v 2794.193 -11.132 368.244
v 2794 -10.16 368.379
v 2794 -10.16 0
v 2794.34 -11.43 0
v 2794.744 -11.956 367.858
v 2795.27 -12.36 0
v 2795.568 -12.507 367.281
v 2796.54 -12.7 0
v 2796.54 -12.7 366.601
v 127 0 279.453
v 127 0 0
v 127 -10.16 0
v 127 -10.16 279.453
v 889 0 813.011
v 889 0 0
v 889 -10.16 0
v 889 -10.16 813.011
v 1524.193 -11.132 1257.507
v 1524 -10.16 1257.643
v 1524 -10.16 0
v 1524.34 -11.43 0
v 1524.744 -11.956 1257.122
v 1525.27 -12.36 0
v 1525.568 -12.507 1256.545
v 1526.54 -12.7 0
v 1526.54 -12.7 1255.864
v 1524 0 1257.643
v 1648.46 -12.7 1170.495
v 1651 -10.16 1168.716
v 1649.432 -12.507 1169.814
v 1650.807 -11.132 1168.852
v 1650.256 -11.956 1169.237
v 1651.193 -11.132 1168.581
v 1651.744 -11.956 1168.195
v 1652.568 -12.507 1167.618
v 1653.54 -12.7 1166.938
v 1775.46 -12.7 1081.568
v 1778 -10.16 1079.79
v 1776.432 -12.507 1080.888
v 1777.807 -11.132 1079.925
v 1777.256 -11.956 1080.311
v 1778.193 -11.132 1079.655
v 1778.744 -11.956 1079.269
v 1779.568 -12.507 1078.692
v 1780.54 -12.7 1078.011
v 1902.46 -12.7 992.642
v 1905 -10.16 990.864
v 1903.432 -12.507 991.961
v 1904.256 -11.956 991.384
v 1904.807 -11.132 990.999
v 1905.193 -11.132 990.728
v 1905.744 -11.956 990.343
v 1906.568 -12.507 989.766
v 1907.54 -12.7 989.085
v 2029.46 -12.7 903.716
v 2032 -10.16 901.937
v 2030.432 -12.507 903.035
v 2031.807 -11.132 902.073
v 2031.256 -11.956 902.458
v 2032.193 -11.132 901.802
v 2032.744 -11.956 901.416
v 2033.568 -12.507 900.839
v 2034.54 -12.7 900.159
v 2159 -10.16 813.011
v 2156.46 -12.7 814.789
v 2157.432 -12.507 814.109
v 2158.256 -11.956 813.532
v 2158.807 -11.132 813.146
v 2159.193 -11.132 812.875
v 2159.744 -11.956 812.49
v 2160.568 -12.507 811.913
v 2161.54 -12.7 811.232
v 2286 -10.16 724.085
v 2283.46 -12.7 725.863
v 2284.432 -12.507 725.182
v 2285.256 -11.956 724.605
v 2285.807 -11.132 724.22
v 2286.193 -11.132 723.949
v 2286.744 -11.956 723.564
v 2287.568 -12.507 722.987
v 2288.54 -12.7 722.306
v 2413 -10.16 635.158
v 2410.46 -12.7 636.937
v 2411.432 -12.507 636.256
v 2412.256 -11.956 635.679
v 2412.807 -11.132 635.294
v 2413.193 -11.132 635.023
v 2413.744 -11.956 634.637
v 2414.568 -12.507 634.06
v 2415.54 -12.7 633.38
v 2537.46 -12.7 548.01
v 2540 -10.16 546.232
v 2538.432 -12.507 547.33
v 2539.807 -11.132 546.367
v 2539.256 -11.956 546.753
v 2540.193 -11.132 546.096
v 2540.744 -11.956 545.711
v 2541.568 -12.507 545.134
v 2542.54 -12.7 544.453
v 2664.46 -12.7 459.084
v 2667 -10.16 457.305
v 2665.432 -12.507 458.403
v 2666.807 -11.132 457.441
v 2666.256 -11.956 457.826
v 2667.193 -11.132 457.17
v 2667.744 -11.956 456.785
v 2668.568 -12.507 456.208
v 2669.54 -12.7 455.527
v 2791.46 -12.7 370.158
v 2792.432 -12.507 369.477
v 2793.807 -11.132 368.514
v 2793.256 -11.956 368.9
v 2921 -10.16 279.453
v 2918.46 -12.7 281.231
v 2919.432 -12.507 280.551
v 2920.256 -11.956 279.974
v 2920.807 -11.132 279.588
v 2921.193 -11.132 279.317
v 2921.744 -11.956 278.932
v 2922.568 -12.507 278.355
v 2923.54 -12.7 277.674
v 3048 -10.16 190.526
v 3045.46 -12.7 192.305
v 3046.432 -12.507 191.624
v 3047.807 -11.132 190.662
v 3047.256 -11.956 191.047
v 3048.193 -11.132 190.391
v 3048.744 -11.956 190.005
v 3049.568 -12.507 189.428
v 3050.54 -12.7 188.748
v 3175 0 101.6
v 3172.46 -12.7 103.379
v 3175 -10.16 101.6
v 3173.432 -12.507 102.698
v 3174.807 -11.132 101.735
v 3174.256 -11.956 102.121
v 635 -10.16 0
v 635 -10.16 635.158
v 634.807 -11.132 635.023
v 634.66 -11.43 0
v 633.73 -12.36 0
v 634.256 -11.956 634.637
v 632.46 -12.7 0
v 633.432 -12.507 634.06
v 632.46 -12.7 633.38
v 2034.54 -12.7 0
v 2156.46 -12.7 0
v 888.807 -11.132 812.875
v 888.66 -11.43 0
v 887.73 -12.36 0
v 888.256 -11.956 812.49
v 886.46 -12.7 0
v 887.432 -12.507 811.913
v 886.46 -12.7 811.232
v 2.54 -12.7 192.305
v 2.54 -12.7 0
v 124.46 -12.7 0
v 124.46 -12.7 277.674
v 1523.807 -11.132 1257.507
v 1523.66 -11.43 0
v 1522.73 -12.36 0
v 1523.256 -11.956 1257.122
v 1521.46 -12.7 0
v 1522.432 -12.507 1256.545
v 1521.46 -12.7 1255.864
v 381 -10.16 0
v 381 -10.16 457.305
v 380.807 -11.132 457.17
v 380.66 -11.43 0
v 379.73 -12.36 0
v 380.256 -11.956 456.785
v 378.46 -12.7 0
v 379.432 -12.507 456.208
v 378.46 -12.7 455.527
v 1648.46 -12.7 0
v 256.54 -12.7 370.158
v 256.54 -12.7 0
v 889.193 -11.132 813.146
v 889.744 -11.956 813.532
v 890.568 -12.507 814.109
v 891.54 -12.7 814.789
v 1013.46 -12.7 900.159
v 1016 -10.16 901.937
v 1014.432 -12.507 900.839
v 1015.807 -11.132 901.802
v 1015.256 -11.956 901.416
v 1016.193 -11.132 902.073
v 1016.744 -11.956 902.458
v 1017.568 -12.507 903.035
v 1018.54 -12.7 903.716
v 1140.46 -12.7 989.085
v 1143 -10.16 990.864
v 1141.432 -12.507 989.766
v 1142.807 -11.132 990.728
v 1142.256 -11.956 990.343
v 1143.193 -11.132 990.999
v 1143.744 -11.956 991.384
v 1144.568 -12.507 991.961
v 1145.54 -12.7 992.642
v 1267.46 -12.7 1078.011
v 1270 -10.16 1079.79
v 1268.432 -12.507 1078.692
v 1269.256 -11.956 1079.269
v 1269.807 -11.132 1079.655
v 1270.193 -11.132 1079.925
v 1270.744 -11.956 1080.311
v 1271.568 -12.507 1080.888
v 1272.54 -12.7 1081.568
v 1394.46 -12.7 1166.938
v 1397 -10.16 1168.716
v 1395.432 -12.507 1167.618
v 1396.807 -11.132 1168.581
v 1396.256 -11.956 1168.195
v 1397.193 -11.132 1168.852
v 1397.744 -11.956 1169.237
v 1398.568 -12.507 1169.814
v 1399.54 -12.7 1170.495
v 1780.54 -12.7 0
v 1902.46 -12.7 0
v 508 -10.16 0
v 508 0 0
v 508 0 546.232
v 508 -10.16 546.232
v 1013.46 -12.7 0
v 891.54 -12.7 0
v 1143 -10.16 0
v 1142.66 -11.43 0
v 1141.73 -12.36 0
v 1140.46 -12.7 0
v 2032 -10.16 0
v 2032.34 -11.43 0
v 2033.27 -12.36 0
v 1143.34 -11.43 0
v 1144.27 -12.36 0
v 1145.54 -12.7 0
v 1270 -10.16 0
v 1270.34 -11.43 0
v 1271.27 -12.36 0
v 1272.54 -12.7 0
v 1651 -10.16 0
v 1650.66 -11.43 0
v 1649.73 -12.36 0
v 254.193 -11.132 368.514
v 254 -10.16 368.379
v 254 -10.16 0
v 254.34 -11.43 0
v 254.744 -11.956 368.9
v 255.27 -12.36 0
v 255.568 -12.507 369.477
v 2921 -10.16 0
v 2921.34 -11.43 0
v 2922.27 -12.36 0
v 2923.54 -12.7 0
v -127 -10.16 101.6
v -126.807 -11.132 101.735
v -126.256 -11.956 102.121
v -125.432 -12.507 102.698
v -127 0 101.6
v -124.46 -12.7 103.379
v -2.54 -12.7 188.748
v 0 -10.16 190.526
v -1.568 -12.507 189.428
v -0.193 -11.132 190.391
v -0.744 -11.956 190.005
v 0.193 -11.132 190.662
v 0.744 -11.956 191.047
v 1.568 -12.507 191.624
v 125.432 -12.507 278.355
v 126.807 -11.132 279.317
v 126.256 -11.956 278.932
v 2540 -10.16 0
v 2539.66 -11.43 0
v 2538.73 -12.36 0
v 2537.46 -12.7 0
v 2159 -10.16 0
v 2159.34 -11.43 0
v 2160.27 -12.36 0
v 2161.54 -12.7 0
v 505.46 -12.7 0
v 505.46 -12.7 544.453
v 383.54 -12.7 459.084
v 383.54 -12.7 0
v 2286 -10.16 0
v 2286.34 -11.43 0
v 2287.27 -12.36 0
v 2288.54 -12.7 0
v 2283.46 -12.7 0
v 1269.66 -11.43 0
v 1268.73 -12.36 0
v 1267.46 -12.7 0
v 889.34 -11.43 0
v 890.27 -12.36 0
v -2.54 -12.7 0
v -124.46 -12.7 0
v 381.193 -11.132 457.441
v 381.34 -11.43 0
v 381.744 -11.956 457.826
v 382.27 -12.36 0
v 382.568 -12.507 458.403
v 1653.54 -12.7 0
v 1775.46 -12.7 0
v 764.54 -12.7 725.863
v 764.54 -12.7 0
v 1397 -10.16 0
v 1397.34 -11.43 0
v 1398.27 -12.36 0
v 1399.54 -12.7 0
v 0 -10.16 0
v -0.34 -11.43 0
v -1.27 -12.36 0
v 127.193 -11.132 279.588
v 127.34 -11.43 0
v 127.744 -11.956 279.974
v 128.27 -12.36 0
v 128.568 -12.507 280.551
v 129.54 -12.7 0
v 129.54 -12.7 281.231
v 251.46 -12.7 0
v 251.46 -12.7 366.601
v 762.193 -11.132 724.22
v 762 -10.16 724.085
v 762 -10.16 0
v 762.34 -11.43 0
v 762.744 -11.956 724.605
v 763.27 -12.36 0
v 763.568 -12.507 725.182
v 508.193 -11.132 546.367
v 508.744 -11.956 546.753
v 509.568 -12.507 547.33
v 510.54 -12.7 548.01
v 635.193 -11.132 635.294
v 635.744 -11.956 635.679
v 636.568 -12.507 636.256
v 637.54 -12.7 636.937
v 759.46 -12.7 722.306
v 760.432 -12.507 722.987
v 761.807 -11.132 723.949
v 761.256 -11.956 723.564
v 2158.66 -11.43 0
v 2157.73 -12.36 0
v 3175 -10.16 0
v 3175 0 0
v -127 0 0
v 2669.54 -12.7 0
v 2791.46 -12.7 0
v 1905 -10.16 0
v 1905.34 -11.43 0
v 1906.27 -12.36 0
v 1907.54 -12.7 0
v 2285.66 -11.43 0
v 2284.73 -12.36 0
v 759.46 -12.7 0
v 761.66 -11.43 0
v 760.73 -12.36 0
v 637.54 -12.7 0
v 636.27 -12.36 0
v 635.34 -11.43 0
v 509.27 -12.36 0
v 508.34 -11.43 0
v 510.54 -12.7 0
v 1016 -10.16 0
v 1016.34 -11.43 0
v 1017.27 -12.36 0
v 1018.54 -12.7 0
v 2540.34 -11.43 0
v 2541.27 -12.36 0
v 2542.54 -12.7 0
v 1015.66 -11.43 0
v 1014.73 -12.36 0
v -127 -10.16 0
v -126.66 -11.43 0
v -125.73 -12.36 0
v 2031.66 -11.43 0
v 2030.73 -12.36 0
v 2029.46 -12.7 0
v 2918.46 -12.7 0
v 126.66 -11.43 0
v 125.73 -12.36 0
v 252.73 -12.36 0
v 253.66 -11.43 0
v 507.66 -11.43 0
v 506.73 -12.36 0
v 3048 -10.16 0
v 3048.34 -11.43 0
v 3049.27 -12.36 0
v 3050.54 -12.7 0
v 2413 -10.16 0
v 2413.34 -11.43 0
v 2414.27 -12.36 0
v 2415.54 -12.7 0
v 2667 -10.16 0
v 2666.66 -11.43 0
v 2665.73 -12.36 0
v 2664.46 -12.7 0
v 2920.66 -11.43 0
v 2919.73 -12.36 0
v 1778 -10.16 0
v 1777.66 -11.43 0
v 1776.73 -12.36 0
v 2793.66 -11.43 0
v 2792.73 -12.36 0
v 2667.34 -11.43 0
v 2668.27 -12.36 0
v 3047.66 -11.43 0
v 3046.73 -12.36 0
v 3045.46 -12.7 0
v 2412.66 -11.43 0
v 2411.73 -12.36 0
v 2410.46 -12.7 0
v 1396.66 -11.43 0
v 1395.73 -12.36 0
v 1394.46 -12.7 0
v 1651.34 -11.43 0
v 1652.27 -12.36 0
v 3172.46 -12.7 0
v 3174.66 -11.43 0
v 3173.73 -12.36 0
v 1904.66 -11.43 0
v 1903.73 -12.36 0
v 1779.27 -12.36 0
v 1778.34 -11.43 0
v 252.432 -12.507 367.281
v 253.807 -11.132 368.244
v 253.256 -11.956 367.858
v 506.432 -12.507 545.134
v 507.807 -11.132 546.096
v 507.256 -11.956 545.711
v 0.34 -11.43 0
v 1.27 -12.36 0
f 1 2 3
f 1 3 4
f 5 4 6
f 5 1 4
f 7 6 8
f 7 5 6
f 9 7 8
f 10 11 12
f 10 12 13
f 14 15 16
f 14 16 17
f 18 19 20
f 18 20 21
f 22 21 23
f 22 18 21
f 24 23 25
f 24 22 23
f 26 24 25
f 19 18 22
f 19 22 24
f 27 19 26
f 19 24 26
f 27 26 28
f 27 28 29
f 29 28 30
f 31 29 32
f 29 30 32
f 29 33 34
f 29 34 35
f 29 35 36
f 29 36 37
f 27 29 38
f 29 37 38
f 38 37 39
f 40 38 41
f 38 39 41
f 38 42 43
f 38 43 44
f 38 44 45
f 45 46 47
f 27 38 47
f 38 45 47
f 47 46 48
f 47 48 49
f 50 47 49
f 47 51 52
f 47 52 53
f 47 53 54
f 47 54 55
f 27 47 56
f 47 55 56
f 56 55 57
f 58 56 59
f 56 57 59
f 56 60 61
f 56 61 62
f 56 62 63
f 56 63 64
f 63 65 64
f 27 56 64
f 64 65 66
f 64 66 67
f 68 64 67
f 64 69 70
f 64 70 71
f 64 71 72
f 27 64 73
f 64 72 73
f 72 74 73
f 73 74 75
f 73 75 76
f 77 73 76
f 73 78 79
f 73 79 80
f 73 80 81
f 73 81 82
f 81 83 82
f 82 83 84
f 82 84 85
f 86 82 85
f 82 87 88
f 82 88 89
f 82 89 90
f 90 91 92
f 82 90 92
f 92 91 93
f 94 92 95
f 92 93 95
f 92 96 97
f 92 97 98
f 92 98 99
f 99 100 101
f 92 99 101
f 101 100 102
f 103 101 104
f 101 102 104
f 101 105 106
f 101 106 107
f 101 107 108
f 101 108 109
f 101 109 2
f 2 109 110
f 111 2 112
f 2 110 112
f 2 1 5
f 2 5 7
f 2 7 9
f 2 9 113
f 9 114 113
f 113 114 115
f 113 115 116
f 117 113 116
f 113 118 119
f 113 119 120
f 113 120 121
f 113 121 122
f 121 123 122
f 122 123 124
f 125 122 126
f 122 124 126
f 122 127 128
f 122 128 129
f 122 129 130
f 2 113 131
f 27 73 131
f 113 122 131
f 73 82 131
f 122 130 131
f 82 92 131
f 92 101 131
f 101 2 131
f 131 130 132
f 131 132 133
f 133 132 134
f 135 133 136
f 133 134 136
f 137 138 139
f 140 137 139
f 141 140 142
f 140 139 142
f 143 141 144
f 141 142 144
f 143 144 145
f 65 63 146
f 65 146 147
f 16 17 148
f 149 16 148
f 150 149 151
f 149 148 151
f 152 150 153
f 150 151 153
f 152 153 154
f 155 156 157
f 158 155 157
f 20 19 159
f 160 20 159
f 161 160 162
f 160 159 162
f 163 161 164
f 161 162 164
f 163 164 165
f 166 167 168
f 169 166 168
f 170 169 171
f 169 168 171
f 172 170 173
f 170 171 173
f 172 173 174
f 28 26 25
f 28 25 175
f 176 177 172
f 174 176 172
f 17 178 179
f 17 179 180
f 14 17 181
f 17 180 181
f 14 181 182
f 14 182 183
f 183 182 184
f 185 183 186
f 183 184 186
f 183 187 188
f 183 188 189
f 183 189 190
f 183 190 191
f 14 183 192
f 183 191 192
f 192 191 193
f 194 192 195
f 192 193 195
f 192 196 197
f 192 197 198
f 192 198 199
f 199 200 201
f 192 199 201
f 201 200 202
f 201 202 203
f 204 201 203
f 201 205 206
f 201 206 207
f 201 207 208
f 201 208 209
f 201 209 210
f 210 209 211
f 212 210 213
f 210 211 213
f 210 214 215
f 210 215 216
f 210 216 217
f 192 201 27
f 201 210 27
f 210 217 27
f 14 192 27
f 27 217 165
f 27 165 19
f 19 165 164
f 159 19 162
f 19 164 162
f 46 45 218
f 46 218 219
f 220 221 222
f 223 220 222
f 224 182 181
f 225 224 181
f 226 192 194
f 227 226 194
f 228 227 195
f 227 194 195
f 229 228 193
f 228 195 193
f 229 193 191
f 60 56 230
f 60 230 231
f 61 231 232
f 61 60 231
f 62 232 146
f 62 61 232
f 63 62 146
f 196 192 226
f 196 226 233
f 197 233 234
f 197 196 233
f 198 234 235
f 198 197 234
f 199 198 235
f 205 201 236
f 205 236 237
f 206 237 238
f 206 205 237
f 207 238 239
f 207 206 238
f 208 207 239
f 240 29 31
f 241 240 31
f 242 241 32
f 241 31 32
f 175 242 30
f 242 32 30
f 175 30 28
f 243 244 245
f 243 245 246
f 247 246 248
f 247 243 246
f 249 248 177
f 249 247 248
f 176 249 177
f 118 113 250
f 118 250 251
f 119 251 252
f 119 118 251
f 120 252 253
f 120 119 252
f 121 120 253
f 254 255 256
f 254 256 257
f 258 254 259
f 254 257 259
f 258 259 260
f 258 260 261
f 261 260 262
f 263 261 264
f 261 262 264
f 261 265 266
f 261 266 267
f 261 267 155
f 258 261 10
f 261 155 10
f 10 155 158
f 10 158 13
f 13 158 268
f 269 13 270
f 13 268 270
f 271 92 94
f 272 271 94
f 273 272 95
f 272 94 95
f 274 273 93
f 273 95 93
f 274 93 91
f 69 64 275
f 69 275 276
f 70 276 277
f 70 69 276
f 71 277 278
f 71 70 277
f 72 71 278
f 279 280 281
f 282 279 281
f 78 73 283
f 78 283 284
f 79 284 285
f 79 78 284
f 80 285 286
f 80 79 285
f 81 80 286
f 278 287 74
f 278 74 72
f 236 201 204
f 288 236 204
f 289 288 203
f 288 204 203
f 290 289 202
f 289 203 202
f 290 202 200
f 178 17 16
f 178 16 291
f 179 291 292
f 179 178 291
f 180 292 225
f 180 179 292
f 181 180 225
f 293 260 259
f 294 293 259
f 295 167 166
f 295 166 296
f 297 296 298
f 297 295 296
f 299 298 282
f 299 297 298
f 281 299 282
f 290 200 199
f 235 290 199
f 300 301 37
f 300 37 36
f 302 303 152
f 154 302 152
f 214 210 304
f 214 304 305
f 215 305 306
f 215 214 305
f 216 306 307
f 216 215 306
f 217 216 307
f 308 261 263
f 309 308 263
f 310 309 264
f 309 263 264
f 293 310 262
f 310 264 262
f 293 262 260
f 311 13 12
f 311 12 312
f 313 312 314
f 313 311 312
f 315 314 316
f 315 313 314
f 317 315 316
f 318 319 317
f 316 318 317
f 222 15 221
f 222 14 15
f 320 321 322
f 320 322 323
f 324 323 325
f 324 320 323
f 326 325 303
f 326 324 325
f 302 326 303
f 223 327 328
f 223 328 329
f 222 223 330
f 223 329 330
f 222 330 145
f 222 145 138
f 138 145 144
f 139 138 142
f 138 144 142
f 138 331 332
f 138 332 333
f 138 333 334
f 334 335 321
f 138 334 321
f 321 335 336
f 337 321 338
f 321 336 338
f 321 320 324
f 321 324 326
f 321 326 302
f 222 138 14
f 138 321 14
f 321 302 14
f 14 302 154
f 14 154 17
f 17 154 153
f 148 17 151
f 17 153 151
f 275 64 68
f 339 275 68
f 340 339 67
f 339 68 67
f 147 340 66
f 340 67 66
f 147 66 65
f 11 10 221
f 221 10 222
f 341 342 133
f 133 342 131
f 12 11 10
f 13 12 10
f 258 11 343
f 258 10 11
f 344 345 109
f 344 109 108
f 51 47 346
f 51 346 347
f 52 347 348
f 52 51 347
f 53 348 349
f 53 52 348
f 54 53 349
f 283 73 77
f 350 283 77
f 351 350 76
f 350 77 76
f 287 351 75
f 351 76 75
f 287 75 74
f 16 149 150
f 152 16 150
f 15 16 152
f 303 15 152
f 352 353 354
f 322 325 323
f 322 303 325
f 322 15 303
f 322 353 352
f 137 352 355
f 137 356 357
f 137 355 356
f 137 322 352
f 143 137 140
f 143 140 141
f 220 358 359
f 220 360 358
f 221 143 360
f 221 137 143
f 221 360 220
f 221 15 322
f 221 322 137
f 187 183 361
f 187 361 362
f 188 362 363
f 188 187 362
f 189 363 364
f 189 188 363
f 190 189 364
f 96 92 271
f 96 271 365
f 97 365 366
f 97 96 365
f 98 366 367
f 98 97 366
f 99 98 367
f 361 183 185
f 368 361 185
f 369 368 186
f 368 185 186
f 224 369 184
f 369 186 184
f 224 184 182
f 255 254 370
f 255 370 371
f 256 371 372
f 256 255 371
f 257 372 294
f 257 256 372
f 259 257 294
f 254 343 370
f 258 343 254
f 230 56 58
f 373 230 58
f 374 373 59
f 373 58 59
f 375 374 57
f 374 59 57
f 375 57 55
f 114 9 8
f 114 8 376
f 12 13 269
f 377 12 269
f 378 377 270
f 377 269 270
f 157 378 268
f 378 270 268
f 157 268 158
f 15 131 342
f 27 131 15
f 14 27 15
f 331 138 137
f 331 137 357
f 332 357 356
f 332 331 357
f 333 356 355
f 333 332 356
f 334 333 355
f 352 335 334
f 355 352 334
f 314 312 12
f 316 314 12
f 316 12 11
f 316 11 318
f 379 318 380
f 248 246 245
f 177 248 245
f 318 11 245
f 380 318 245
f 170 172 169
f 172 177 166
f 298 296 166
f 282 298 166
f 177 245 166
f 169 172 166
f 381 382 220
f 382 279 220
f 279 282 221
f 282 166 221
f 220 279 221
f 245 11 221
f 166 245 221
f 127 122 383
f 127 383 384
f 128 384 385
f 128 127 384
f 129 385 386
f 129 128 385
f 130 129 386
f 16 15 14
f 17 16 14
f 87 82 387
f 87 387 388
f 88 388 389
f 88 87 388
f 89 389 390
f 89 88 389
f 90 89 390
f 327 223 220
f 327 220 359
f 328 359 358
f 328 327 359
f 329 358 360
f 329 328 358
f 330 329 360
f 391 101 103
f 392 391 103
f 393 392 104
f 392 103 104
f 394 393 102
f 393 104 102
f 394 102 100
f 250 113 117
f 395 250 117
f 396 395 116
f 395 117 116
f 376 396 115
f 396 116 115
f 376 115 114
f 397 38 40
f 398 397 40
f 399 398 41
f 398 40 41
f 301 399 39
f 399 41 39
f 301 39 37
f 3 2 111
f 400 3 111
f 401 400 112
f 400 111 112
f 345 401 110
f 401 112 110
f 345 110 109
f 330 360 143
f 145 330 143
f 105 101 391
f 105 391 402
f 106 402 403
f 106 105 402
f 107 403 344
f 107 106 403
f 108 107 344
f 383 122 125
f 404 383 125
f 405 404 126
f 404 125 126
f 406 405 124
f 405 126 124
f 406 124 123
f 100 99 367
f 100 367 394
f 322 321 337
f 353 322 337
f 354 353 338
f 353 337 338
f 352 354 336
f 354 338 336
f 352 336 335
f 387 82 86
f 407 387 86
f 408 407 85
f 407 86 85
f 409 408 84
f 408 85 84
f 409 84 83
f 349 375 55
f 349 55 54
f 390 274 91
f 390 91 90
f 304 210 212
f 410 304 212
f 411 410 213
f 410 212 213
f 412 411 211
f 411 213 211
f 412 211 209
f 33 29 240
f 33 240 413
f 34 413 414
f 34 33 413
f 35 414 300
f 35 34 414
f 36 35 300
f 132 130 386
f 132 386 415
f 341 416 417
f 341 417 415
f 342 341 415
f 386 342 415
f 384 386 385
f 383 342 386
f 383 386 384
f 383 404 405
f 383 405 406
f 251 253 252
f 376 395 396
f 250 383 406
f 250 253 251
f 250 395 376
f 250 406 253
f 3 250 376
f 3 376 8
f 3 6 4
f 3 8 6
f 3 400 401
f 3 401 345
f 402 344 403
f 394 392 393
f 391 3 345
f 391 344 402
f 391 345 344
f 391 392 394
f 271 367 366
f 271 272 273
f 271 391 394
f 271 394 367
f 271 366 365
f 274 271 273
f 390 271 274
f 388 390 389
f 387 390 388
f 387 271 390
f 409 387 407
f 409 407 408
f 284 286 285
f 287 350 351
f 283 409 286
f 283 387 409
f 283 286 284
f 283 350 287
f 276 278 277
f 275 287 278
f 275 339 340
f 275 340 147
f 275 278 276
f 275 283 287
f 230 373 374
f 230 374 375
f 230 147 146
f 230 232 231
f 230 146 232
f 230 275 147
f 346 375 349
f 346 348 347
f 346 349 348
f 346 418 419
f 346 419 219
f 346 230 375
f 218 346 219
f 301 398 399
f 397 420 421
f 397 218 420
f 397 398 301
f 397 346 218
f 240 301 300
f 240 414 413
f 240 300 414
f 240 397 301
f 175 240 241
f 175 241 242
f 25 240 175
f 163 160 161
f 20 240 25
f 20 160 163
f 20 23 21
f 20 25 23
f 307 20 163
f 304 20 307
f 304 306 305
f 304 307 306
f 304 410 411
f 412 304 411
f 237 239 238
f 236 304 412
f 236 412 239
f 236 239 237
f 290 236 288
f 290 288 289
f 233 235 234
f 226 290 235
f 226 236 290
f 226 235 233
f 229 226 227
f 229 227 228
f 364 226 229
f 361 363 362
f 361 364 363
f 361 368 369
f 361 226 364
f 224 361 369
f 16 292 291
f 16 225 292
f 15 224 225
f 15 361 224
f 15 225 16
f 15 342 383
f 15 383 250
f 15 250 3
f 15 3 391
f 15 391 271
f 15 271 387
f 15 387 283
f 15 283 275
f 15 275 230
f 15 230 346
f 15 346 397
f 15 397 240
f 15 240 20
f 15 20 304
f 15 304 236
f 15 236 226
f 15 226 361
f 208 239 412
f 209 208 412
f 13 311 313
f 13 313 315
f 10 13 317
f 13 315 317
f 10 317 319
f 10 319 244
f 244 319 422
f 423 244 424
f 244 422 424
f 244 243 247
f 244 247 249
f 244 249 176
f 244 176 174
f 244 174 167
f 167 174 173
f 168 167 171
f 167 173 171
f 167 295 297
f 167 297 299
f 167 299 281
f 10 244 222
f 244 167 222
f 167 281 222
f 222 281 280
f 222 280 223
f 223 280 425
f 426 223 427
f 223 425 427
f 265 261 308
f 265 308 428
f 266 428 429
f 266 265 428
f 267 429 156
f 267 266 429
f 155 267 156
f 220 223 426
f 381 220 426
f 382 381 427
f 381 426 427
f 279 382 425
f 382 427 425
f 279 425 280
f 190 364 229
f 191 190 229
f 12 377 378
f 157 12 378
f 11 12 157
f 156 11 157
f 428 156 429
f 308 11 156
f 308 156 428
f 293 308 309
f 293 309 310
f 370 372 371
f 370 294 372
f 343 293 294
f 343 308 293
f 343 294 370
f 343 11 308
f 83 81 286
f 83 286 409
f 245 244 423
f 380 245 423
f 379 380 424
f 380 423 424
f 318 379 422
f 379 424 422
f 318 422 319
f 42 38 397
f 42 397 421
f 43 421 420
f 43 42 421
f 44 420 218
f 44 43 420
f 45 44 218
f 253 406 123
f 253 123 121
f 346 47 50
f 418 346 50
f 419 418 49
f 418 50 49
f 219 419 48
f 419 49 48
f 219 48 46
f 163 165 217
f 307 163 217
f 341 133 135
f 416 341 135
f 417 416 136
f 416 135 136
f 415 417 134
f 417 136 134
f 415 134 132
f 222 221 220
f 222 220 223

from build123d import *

# Parameters (mm, degrees)
F0_W      = 127
F0_H      = 1524
F1_DEPTH  = 12.7
F2_R      = 2.54
F10_DEPTH = 12.7


with BuildPart() as f1:
    # F0 (on Front) → F1 (new body)
    with BuildSketch(Plane.XZ):
        with Locations((63.5, 762)):
            Rectangle(F0_W, F0_H)
    extrude(amount=F1_DEPTH)

    # F2
    f2_edges = [f1.edges().sort_by_distance(p)[0] for p in [
        (0, -12.7, 762),
        (127, -12.7, 762),
    ]]
    fillet(f2_edges, radius=F2_R)


with BuildPart() as f3_1:
    # F3: instance of F1
    add(f1.part.mirror(Plane(origin=(127, -5.08, 762), x_dir=(0, 1, 0), z_dir=(1, 0, 0))))



with BuildPart() as f3_1_1:
    add(f3_1.part)
    # F4: F1, F3_1 across face
    add(f1.part.mirror(Plane(origin=(254, -5.08, 762), x_dir=(0, 1, 0), z_dir=(1, 0, 0))))
    add(f3_1.part.mirror(Plane(origin=(254, -5.08, 762), x_dir=(0, 1, 0), z_dir=(1, 0, 0))))


with BuildPart() as f5_1:
    # F5: instance of F1
    add(f1.part.mirror(Plane(origin=(508, -5.08, 762), x_dir=(0, 1, 0), z_dir=(1, 0, 0))))



with BuildPart() as f5_2:
    # F5: instance of F3_1
    add(f3_1_1.part.mirror(Plane(origin=(508, -5.08, 762), x_dir=(0, 1, 0), z_dir=(1, 0, 0))))


with BuildPart() as f5_1_1:
    add(f5_1.part)
    # F6: F5_2, F5_1 across face
    add(f5_2.part.mirror(Plane(origin=(1016, -5.08, 762), x_dir=(0, 1, 0), z_dir=(1, 0, 0))))
    add(f5_1.part.mirror(Plane(origin=(1016, -5.08, 762), x_dir=(0, 1, 0), z_dir=(1, 0, 0))))



with BuildPart() as f1_1:
    add(f1.part)

    # F7: F1 across face
    add(f1.part.mirror(Plane(origin=(0, -5.08, 762), x_dir=(0, -1, 0), z_dir=(-1, 0, 0))))


with BuildPart() as f5_1_2:
    add(f5_1_1.part)
    # F8: F1, F3_1, F5_2, F5_1 across face
    add(f1_1.part.mirror(Plane(origin=(1524, -5.08, 762), x_dir=(0, 1, 0), z_dir=(1, 0, 0))))
    add(f3_1_1.part.mirror(Plane(origin=(1524, -5.08, 762), x_dir=(0, 1, 0), z_dir=(1, 0, 0))))
    add(f5_2.part.mirror(Plane(origin=(1524, -5.08, 762), x_dir=(0, 1, 0), z_dir=(1, 0, 0))))
    add(f5_1_1.part.mirror(Plane(origin=(1524, -5.08, 762), x_dir=(0, 1, 0), z_dir=(1, 0, 0))))


with BuildPart() as f10:
    # F9 (on face) → F10 (new body)
    with BuildSketch(Plane.XZ.offset(12.7)):
        Polygon((-202.0635317546, 1586.9170427322), (-127, 101.6), (1524, 1257.6426455842), (1524, 1569.7422540038), align=None)
        Polygon((1524, 1569.7422540038), (1524, 1257.6426455842), (3175, 101.6), (3229.8866648692, 1552.7682304382), align=None)
    extrude(amount=-F10_DEPTH)


with BuildPart() as f1_2:
    add(f1_1.part)

    # F11: cut F10
    add(f10.part, mode=Mode.SUBTRACT)


with BuildPart() as f3_1_2:
    add(f3_1_1.part)

    # F11: cut F10
    add(f10.part, mode=Mode.SUBTRACT)


with BuildPart() as f5_2_1:
    add(f5_2.part)

    # F11: cut F10
    add(f10.part, mode=Mode.SUBTRACT)


with BuildPart() as f5_1_3:
    add(f5_1_2.part)

    # F11: cut F10
    add(f10.part, mode=Mode.SUBTRACT)


solid = Compound([f1_2.part, f3_1_2.part, f5_2_1.part, f5_1_3.part])
